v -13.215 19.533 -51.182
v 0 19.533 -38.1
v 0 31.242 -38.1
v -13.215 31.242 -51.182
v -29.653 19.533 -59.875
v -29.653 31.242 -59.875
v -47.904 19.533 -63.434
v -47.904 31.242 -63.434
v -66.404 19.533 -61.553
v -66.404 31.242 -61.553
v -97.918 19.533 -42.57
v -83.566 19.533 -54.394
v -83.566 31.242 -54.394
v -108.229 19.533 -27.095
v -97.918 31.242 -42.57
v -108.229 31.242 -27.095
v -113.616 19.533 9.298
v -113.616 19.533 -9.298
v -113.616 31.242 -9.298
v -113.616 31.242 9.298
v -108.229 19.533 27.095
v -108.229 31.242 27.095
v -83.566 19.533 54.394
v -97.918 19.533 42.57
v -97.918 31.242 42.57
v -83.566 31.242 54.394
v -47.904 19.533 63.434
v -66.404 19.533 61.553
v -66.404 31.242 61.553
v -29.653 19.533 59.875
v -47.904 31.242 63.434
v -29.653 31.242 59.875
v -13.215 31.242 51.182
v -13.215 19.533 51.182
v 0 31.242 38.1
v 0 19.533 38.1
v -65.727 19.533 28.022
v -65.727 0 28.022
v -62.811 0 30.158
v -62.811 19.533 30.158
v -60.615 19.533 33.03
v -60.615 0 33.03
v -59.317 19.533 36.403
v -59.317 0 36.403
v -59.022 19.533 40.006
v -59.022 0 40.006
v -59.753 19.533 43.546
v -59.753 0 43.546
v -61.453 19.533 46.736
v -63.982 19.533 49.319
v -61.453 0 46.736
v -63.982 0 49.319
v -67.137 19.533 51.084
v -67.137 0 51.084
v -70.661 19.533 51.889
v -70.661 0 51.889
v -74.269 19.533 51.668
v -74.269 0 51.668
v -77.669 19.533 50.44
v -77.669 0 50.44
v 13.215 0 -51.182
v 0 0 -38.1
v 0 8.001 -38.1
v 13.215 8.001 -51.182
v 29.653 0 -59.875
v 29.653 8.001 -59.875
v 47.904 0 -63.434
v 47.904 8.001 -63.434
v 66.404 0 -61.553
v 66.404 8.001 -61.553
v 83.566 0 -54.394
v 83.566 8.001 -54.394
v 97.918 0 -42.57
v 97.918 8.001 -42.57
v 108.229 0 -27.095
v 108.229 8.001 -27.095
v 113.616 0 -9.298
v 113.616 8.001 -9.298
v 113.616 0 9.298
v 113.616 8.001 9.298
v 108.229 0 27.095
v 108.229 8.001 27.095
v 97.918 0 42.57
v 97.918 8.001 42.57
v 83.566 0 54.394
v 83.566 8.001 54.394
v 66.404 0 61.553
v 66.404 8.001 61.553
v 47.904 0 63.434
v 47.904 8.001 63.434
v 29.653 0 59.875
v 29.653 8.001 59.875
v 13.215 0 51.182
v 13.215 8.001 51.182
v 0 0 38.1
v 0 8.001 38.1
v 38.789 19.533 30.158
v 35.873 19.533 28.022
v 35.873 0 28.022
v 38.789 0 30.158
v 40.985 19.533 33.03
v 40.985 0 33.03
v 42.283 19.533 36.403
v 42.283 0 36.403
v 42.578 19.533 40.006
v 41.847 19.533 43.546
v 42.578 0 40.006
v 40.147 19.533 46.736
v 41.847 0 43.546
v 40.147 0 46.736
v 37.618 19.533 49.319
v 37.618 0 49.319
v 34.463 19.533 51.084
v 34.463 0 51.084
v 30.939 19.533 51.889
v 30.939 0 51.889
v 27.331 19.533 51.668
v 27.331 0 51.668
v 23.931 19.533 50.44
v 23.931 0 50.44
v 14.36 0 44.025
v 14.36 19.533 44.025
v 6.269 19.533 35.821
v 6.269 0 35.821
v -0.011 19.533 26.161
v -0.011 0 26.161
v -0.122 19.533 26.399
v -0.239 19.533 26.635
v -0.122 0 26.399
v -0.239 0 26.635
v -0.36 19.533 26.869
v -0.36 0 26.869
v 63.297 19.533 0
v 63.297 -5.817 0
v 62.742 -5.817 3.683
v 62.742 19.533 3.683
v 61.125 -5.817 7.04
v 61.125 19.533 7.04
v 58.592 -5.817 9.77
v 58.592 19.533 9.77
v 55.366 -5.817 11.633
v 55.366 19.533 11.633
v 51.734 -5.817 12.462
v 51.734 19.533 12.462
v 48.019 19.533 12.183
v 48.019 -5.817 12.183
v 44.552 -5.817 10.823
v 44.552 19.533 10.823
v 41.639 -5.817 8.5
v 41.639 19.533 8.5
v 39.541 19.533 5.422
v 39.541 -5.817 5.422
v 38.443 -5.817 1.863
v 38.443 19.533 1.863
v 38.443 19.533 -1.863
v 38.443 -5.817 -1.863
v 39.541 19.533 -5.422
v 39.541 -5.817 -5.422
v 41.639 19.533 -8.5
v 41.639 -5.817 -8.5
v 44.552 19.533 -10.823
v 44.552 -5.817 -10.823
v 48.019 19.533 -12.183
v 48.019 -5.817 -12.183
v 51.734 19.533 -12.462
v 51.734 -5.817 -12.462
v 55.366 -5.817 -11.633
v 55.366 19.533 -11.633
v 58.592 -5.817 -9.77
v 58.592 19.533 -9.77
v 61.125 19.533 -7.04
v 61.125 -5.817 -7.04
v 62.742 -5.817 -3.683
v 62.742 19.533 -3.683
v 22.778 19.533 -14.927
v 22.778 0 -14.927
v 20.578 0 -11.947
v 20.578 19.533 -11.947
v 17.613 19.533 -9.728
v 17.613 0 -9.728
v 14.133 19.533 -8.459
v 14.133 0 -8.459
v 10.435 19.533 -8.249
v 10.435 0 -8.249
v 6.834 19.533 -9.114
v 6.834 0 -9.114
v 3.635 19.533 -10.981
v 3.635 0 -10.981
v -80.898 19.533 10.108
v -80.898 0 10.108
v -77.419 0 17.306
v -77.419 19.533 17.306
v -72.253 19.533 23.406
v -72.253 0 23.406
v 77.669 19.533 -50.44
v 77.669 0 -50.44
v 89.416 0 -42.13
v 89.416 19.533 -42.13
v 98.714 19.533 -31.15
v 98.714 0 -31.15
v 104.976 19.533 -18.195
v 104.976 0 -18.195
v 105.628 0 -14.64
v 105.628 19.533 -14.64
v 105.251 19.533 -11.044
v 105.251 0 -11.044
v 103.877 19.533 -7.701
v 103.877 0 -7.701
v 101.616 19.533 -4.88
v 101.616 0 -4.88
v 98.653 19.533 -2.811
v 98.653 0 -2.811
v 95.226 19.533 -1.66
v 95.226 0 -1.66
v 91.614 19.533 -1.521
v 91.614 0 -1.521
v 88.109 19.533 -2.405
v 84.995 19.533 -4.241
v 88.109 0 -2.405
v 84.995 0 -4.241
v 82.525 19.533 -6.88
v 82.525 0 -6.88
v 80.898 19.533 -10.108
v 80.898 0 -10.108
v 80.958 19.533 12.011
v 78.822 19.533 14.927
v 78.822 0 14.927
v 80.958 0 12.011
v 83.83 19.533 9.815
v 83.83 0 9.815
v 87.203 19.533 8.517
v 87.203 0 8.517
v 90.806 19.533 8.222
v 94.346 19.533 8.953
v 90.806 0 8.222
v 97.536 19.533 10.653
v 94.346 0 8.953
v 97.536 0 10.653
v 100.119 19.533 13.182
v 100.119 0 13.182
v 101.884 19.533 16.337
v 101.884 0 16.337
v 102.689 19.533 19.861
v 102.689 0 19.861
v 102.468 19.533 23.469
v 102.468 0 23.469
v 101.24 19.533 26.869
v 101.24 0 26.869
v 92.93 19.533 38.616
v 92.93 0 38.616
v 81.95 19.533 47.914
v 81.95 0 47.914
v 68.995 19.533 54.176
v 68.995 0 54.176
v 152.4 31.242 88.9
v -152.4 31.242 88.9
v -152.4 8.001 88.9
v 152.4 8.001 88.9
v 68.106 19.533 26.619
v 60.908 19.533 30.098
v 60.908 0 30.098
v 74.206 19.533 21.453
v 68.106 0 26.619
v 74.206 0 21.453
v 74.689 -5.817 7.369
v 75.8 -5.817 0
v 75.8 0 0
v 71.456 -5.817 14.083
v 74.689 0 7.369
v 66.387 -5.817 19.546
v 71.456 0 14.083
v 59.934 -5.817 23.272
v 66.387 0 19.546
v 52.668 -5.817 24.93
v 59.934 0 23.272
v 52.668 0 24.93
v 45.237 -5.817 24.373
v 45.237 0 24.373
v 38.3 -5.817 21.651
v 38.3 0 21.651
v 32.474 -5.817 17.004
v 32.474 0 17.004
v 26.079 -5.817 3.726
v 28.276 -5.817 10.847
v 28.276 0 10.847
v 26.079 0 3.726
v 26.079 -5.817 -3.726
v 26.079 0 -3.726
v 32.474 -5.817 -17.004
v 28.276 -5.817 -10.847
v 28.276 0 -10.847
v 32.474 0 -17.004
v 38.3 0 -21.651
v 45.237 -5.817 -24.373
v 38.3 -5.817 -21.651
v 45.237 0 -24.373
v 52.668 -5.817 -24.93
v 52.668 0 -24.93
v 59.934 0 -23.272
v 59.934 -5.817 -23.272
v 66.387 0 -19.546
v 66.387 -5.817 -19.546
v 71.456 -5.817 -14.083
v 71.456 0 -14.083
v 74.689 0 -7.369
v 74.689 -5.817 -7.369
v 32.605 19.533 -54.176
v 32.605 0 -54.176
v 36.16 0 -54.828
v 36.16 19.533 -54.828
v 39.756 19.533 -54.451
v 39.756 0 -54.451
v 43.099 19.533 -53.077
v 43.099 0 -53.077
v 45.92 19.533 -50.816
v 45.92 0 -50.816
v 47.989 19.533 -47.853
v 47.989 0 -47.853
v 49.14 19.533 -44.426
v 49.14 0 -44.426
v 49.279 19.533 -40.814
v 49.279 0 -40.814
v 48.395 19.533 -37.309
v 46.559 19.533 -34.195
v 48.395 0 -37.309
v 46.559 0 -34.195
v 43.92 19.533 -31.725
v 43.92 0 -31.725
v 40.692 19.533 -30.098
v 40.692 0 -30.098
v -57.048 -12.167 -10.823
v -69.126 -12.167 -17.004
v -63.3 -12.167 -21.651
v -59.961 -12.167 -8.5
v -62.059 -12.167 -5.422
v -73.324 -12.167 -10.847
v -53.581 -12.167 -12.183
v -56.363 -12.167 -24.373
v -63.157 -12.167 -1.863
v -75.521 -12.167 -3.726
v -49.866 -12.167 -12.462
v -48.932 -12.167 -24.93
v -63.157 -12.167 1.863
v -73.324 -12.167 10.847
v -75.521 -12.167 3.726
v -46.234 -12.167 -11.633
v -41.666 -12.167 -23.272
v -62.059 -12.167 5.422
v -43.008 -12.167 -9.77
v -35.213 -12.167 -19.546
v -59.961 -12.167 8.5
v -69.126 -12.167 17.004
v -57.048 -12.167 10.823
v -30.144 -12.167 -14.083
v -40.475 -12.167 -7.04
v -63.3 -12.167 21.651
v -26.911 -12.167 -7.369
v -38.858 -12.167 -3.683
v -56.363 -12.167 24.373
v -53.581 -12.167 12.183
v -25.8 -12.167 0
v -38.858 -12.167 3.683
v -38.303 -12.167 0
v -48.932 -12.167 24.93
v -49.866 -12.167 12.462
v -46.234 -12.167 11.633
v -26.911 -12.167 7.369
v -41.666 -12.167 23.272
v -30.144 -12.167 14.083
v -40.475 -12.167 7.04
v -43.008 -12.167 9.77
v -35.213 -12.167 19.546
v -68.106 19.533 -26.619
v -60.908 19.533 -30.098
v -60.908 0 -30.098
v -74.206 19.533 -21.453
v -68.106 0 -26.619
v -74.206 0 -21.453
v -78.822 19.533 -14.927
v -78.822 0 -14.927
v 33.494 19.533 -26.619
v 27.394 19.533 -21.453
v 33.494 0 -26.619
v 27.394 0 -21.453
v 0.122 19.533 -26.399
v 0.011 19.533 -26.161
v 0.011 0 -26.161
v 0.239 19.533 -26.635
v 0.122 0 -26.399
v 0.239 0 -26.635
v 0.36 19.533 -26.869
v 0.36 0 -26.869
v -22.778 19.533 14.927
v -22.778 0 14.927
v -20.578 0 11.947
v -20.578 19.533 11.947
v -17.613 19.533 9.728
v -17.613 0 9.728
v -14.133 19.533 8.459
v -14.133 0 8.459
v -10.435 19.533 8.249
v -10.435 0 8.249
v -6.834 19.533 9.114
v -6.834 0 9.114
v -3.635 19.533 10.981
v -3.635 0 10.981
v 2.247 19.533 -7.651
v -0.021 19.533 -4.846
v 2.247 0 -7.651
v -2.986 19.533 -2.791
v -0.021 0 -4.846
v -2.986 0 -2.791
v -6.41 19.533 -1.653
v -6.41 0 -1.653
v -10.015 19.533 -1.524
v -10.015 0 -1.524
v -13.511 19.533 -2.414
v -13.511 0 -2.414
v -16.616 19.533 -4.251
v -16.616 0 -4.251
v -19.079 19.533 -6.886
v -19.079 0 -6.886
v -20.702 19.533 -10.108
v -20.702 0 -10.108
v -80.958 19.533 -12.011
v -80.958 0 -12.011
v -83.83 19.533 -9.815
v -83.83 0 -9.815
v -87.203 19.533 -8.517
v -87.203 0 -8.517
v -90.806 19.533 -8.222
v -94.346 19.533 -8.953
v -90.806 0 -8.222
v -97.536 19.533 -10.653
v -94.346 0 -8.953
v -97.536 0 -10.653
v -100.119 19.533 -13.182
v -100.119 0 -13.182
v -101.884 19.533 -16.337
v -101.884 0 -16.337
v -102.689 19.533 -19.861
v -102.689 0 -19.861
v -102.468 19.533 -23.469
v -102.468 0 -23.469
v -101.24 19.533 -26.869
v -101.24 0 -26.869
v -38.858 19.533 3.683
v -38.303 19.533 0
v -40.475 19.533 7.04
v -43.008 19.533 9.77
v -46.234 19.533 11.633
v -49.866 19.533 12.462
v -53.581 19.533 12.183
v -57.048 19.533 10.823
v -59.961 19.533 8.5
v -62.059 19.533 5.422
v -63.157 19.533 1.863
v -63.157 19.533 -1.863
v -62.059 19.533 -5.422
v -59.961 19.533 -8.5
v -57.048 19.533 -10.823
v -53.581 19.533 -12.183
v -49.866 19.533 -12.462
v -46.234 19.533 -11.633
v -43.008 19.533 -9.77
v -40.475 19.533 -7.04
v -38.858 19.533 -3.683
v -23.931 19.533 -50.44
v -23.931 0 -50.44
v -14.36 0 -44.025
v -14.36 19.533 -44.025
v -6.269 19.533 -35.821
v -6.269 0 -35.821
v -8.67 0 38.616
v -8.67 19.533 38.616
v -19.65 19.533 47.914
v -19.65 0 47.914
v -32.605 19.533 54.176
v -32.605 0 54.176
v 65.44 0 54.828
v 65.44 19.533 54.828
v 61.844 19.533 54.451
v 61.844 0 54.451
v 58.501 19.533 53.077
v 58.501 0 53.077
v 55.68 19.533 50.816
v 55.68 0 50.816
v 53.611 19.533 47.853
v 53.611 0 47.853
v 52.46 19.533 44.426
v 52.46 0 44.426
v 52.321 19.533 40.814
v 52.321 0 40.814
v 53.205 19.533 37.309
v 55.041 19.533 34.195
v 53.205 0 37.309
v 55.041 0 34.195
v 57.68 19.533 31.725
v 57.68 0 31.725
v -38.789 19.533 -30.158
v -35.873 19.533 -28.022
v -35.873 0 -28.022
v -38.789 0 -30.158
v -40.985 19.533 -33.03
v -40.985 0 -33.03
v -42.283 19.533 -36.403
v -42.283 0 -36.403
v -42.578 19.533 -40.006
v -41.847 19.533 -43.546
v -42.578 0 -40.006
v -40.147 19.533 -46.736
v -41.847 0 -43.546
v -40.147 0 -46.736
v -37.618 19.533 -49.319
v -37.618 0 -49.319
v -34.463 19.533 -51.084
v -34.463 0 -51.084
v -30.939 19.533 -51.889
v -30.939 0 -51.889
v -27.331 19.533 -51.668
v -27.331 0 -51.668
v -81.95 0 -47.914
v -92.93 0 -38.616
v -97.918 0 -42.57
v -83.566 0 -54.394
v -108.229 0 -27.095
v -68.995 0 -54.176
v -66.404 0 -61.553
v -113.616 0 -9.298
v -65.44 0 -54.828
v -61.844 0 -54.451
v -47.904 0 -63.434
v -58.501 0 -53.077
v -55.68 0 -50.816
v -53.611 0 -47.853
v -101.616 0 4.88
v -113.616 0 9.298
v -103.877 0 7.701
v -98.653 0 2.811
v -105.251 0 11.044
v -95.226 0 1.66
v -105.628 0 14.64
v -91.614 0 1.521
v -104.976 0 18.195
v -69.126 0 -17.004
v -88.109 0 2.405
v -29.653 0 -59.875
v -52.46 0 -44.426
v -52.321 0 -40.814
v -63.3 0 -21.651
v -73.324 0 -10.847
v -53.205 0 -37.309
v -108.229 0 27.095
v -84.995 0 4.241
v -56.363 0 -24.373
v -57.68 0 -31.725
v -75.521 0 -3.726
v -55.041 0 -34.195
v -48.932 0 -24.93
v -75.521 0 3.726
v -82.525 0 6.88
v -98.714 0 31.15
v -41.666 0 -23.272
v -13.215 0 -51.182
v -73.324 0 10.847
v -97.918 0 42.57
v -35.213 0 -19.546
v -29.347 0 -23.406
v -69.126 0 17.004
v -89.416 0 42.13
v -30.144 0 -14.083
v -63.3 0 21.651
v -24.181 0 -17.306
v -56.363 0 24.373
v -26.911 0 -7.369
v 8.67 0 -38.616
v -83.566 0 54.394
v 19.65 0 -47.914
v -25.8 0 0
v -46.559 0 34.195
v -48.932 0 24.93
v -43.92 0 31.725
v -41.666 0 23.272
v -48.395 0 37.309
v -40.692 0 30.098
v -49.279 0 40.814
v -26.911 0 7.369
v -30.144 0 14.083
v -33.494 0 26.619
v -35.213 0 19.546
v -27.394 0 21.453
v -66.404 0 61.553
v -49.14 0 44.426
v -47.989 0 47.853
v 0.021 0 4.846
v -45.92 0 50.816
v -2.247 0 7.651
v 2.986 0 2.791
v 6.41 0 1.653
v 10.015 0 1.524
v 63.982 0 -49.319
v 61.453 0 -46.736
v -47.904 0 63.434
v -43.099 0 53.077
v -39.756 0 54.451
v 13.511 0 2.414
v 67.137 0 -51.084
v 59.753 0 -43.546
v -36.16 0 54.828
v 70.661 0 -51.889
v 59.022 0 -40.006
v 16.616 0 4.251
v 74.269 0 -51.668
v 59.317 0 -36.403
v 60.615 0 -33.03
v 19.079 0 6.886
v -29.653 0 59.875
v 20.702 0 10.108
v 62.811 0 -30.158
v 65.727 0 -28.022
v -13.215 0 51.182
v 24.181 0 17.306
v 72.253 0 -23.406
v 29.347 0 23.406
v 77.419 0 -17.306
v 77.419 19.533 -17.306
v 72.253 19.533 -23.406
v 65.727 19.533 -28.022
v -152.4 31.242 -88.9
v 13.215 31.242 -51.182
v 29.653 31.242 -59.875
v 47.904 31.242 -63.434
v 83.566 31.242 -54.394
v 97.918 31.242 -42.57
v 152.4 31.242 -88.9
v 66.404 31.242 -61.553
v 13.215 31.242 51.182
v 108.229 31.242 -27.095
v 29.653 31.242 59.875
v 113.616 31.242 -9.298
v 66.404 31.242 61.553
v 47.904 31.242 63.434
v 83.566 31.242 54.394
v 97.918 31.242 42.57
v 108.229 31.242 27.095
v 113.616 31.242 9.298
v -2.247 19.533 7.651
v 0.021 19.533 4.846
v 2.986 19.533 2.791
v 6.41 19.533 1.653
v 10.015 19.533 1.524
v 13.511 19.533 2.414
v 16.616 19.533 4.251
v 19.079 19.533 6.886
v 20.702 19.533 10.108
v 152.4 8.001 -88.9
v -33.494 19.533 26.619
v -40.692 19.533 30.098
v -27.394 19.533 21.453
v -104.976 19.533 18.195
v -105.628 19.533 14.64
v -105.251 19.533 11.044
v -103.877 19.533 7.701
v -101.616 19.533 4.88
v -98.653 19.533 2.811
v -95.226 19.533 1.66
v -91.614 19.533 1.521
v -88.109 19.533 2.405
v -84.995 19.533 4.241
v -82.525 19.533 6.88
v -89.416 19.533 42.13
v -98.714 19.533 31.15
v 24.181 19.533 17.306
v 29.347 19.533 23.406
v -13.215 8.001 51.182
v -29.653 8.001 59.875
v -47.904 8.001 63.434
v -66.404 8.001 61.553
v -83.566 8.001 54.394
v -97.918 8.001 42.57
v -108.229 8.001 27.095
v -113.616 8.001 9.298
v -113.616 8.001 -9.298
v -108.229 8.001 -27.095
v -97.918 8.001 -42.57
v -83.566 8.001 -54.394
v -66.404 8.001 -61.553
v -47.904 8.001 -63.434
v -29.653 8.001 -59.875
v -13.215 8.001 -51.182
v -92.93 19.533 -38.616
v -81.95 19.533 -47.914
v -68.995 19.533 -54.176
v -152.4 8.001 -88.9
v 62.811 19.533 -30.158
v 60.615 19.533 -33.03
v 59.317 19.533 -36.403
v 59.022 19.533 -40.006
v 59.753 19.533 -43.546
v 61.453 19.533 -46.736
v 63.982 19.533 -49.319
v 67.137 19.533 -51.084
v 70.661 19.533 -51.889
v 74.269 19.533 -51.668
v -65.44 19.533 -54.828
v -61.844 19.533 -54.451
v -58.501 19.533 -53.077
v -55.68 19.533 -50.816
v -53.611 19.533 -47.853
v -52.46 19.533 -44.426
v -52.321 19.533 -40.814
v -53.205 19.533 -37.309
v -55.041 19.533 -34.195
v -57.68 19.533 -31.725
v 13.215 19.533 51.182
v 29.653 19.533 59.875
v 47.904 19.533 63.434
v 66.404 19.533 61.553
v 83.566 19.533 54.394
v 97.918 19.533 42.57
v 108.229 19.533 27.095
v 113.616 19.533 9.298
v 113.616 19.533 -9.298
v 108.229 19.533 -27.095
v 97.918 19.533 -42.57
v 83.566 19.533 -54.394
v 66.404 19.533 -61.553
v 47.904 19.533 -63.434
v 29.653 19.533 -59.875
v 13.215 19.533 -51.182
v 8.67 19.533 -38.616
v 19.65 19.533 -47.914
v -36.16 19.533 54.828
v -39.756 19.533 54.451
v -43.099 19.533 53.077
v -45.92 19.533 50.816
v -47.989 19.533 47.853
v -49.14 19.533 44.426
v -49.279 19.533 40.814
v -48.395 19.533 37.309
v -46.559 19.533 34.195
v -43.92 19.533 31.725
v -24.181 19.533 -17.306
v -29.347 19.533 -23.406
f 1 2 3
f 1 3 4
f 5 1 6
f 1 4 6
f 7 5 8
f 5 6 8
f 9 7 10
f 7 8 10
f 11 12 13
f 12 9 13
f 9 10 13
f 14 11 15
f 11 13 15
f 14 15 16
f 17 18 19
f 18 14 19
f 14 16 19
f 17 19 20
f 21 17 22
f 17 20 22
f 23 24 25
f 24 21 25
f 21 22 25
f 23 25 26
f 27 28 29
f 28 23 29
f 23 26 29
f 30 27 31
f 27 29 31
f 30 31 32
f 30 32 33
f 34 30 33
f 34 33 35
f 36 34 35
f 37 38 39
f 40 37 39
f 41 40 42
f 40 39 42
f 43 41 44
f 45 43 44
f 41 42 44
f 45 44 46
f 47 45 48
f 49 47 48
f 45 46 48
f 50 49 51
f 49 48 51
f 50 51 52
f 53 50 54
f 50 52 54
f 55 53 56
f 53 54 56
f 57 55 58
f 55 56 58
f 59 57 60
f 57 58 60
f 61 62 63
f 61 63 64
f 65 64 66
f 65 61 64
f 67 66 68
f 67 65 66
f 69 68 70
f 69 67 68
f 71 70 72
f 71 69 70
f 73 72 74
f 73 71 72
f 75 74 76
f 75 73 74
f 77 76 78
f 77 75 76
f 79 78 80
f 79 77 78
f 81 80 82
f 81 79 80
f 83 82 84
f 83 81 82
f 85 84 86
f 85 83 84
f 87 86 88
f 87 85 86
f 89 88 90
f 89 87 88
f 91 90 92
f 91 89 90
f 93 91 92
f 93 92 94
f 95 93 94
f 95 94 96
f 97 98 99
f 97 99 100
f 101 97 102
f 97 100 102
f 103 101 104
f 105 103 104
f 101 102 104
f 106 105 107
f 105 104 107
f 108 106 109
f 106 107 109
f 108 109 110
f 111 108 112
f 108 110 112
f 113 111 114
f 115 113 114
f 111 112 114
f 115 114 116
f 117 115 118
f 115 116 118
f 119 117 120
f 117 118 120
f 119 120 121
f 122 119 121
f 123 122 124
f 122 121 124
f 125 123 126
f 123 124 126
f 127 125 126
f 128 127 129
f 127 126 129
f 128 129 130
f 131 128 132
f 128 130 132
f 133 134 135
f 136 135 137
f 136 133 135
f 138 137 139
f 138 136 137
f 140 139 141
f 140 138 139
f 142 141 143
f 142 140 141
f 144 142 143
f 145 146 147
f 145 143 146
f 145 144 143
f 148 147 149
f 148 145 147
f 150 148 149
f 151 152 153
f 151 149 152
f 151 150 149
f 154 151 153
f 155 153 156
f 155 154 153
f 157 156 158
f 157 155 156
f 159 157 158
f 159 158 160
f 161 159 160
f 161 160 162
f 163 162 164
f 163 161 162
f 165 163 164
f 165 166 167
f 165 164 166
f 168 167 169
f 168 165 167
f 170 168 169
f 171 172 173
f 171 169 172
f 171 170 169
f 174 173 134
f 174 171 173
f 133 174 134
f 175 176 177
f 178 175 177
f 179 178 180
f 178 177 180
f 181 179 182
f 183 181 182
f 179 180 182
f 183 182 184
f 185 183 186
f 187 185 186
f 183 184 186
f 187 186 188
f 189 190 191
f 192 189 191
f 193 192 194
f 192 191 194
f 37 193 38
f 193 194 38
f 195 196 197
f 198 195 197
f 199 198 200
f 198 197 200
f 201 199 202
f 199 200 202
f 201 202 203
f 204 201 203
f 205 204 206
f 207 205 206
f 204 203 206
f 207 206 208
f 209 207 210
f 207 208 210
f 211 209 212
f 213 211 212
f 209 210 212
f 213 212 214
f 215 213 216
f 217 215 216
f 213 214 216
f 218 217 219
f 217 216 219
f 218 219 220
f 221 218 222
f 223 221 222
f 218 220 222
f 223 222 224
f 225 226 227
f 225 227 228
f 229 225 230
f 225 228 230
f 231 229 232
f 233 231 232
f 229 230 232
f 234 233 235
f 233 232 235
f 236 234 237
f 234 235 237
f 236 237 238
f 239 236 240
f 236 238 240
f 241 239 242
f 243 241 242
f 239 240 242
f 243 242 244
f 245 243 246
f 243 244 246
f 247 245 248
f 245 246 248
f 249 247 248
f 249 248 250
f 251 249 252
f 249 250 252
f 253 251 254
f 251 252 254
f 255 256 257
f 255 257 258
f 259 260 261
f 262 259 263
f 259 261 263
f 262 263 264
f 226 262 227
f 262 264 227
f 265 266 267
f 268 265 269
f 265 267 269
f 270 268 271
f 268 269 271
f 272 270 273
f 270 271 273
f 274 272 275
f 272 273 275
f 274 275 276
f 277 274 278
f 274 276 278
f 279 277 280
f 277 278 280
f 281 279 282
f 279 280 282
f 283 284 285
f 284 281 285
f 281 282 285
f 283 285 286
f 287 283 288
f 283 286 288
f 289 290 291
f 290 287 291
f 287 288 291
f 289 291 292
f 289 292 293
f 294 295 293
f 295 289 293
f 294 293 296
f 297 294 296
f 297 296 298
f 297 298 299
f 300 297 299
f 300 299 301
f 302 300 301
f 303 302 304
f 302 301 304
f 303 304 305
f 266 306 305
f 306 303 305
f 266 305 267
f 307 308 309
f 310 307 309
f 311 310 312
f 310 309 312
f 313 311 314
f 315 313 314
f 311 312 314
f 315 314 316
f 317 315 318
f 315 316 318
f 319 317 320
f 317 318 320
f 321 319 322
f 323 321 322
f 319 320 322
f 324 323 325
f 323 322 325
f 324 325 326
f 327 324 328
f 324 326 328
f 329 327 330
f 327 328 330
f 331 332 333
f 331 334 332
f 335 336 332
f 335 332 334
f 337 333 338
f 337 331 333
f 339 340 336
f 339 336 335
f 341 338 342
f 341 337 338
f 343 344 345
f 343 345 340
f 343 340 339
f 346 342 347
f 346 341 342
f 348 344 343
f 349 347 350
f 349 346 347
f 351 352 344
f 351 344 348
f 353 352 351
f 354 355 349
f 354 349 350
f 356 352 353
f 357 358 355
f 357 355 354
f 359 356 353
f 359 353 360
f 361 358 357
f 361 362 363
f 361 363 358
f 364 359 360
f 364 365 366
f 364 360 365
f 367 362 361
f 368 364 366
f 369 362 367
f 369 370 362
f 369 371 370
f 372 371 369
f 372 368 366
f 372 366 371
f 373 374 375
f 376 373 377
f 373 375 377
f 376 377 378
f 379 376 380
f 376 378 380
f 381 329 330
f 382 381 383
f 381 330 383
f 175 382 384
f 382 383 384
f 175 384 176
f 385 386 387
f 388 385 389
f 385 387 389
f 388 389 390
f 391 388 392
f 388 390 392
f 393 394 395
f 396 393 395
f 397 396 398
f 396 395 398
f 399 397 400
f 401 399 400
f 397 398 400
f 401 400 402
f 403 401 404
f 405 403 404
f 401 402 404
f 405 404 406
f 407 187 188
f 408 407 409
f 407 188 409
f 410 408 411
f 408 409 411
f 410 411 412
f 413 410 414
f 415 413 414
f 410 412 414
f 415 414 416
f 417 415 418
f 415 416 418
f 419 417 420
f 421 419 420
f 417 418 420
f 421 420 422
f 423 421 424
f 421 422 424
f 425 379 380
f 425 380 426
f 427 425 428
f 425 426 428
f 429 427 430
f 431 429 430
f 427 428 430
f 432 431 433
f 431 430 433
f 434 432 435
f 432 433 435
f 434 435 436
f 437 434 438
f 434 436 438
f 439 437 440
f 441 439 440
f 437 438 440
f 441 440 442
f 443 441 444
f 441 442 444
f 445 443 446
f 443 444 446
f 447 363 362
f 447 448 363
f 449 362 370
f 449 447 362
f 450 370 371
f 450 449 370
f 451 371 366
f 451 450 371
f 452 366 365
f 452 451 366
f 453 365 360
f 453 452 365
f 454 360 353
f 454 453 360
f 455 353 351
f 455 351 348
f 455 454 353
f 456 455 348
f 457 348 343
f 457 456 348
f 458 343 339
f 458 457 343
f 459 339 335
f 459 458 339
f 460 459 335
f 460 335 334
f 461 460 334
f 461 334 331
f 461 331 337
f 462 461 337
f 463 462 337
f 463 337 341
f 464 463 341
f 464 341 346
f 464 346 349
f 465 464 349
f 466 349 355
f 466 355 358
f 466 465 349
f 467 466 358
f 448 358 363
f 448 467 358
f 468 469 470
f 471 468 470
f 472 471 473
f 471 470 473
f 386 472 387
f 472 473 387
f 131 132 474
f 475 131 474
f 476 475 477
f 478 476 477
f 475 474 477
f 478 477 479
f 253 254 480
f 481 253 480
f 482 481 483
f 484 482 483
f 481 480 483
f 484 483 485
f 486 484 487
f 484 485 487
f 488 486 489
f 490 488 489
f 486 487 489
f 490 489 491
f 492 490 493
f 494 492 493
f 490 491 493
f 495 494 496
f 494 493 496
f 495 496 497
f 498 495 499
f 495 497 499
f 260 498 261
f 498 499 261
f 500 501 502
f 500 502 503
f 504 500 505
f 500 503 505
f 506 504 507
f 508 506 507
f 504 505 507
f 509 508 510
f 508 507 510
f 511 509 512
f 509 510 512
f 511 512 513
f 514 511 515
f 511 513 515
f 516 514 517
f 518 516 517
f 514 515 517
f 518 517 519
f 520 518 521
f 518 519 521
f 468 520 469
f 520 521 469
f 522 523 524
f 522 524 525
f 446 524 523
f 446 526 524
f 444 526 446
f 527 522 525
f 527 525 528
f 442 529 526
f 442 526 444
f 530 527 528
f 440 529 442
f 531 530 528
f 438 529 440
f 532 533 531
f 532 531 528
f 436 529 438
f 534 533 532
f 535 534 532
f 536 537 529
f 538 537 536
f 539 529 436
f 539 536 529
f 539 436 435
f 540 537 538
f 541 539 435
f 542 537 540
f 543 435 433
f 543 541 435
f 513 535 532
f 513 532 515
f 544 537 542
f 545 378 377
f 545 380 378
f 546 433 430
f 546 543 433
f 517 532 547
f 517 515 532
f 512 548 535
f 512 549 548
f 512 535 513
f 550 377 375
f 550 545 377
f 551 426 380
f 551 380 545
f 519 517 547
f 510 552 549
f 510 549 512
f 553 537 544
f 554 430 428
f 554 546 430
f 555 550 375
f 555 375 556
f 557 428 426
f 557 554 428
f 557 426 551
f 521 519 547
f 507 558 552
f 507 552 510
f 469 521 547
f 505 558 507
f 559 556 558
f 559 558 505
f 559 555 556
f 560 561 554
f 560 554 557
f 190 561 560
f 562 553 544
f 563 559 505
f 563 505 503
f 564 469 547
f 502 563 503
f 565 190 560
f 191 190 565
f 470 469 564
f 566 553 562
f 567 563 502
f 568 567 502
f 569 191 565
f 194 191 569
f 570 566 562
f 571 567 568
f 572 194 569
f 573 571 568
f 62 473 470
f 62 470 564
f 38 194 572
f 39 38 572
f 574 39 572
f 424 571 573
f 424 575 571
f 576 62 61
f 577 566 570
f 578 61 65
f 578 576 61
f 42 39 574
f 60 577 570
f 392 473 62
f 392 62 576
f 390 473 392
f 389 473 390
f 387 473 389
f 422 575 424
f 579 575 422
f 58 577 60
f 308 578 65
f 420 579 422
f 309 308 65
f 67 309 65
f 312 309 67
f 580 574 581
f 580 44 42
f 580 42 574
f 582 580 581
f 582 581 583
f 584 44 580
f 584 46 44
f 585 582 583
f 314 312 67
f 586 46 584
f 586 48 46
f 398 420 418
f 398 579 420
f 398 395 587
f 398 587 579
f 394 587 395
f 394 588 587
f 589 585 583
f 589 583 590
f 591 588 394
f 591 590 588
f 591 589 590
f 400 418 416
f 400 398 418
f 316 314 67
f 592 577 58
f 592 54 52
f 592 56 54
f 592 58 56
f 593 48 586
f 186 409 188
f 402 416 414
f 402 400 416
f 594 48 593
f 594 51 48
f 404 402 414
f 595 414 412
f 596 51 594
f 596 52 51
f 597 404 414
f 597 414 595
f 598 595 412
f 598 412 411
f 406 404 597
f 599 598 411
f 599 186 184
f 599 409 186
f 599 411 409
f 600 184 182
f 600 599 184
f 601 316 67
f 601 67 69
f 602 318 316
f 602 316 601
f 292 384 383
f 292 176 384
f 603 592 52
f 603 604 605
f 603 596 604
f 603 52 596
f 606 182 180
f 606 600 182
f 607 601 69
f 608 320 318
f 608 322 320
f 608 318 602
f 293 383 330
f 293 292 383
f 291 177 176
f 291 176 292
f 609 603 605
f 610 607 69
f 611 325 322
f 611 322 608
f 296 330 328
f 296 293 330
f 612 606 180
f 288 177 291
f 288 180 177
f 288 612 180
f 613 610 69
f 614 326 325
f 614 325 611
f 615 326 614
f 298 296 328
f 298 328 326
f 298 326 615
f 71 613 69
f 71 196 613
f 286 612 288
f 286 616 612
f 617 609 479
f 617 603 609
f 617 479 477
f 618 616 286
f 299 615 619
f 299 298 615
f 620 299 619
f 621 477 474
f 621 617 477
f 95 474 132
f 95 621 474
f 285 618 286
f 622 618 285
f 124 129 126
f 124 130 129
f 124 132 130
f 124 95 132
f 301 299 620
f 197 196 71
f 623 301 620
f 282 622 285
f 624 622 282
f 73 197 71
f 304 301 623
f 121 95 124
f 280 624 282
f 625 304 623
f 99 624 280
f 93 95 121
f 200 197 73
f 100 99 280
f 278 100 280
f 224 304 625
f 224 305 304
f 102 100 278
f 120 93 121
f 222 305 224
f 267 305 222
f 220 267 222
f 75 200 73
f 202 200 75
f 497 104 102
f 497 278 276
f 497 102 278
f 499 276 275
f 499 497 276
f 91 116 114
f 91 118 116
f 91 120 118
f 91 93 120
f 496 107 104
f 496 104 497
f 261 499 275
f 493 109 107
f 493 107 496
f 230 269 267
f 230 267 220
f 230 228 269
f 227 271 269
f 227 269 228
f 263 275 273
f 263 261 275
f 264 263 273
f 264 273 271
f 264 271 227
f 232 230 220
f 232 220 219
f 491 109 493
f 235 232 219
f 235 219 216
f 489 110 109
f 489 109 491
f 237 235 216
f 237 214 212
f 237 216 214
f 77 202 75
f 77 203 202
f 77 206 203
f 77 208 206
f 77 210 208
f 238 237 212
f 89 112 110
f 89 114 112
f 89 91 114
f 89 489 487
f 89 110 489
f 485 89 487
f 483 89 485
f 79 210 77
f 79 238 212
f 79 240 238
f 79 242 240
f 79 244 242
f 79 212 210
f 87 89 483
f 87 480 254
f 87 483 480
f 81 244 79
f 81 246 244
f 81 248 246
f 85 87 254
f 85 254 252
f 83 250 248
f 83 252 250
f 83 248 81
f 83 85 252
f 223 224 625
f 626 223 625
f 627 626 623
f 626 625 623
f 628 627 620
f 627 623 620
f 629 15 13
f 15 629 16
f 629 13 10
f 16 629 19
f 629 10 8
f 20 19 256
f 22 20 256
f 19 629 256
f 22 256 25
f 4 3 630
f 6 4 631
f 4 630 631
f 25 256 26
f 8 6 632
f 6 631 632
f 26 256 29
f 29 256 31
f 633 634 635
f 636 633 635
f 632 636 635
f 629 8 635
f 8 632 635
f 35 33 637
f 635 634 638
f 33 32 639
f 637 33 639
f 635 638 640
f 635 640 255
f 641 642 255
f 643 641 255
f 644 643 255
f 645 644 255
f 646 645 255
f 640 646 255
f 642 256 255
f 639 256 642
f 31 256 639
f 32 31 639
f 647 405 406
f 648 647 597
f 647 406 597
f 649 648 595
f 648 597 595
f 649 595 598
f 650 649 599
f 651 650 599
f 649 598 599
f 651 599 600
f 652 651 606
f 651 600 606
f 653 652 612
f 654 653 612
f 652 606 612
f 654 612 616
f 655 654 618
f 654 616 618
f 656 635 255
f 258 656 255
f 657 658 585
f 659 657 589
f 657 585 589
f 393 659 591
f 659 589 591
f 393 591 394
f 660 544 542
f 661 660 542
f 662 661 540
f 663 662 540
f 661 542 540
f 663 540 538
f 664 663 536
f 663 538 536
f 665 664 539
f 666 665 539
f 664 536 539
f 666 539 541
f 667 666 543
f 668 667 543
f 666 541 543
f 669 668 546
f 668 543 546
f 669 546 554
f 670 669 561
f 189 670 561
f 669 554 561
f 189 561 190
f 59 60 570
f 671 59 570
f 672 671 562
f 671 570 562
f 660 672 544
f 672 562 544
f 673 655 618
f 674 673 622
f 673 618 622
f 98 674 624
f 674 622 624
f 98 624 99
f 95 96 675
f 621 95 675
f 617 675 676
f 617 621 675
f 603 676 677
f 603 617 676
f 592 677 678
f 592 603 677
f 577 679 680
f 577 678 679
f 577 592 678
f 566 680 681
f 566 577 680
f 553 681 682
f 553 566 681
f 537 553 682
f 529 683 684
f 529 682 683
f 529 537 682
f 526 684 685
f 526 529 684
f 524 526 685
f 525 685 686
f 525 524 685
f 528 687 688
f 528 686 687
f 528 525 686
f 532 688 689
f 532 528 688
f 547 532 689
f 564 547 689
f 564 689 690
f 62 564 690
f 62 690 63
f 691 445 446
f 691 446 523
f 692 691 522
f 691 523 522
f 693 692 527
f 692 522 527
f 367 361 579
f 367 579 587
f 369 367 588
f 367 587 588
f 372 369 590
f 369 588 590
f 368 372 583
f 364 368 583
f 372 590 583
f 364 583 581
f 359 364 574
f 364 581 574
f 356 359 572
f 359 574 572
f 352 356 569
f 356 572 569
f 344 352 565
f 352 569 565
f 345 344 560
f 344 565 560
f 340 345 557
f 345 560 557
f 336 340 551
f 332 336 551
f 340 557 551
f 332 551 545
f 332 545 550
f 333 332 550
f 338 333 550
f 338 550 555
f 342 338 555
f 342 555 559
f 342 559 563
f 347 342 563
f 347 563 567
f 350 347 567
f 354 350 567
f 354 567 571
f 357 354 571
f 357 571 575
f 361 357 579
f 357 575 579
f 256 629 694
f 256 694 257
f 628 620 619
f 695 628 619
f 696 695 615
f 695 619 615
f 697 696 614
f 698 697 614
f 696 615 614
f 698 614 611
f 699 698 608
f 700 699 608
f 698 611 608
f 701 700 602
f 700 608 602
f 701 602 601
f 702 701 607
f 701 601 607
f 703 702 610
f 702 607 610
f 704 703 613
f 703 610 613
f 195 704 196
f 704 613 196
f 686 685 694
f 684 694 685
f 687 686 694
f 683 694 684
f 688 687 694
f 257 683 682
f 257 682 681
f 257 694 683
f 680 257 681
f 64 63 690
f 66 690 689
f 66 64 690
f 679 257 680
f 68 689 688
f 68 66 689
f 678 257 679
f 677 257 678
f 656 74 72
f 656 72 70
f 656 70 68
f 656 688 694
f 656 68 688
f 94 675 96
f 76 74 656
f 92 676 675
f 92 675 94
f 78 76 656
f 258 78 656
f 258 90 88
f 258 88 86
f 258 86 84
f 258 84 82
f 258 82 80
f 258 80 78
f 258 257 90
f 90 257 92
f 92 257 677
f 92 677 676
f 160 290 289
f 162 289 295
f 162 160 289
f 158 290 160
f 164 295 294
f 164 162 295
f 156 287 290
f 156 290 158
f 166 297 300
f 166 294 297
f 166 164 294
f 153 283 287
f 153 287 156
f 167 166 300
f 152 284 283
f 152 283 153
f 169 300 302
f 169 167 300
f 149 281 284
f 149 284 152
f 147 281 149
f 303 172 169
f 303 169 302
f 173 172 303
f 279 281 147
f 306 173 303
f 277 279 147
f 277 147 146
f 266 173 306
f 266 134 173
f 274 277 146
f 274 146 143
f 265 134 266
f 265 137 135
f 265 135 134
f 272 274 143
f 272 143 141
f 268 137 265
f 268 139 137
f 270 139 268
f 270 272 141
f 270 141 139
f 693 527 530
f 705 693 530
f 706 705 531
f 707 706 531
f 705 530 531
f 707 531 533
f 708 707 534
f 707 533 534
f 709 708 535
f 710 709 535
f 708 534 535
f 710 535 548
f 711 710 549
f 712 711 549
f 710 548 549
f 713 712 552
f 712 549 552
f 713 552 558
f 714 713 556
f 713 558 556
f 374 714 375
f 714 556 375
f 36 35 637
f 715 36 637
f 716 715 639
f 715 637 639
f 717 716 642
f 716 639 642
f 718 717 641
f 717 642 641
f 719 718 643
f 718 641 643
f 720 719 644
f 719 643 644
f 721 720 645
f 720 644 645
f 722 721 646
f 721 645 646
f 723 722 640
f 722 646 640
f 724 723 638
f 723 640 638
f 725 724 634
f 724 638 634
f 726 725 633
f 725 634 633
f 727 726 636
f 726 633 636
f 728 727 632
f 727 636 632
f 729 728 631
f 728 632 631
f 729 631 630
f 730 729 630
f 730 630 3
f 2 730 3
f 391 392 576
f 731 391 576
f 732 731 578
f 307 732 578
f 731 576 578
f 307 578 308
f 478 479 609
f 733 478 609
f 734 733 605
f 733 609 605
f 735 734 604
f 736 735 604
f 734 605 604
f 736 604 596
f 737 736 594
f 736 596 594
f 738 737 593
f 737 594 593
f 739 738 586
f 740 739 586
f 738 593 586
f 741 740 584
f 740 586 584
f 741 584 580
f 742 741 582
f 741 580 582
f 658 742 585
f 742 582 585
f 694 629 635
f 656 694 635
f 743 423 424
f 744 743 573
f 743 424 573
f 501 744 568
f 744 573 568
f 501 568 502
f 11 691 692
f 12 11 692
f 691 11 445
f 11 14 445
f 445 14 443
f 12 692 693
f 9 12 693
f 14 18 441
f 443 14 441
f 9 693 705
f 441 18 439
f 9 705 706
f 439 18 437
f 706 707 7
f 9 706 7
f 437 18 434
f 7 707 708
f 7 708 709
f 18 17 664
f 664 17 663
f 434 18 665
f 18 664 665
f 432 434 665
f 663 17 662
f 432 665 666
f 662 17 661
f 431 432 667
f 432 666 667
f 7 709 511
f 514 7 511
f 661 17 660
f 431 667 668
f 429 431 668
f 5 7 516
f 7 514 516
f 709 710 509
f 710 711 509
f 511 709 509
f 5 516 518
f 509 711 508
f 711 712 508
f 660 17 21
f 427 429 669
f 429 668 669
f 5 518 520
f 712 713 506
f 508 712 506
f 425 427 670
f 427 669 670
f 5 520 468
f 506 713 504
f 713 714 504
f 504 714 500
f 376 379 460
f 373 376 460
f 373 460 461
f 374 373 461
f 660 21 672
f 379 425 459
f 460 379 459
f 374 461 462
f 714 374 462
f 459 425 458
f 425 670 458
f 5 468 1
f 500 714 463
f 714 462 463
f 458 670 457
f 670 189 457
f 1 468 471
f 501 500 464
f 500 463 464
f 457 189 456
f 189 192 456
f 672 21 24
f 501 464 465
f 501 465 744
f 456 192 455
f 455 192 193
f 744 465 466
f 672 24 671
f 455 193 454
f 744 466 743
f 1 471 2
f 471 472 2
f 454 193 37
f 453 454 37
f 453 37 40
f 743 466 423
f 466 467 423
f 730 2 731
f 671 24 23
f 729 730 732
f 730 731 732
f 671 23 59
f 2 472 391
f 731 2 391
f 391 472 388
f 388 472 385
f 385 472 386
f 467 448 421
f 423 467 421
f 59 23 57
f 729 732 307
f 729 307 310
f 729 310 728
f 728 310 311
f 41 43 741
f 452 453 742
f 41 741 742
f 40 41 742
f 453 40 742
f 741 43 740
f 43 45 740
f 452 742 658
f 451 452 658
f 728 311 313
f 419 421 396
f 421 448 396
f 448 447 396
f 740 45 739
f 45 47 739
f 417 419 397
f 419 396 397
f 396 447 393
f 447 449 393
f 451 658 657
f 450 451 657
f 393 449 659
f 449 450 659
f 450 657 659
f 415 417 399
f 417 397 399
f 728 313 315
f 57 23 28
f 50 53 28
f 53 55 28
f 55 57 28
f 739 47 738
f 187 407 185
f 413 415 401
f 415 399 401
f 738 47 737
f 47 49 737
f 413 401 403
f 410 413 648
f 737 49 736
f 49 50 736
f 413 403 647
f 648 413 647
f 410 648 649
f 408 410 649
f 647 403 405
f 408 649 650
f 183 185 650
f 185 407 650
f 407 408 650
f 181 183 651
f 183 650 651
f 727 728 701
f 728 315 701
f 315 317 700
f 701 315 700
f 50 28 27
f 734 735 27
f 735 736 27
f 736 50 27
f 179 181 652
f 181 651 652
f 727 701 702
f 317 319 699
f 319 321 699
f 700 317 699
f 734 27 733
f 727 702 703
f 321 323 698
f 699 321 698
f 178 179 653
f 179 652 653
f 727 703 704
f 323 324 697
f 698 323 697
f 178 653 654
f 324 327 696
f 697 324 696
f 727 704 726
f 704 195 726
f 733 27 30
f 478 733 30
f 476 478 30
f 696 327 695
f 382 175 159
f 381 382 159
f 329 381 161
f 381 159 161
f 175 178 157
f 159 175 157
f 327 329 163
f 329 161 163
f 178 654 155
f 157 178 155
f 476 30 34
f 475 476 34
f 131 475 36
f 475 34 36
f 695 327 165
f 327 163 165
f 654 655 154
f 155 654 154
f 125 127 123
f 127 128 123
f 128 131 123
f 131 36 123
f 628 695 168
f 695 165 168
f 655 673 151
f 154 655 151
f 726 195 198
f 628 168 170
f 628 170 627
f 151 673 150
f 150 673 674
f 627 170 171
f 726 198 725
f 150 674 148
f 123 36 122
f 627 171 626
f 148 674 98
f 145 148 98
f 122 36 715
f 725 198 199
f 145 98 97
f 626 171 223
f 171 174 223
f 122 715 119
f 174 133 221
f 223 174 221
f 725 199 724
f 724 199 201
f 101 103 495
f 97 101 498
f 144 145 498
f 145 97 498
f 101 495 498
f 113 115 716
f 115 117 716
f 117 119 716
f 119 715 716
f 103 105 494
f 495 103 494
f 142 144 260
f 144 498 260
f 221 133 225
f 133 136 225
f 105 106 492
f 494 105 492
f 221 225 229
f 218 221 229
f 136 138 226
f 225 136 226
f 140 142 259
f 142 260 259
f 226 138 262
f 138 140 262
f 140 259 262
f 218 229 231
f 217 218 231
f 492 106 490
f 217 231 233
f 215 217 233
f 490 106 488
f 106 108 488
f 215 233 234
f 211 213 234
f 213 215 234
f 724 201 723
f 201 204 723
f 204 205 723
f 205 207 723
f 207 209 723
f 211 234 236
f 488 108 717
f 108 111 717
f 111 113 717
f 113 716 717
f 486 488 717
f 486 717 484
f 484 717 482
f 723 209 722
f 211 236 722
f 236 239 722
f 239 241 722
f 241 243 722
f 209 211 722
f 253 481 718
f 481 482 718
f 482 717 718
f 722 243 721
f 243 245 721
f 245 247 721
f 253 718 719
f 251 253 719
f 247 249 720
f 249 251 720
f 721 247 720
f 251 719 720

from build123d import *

# Parameters (mm, degrees)
F2_W          = 304.8
F2_H          = 177.8
F3_DEPTH      = 23.241
F0_R          = 25
F0_R_2        = 12.4968
F4_DEPTH      = 12.1666
F5_DEPTH      = 19.5326
F6_W          = 127
F6_H          = 25.4
F7_DEPTH      = 127
F7_DEPTH_BACK = 127
F9_DEPTH      = 31.243


with BuildPart() as f3:
    # F2 (on offset) → F3 (new body)
    with BuildSketch(Plane.XZ.offset(-31.242)):
        Rectangle(F2_W, F2_H)
        with BuildLine():
            ThreePointArc((0, -38.1), (-114.3, 0), (0, 38.1))
            ThreePointArc((0, 38.1), (70.8804631421, 60.2413894262), (114.3, 0))
            ThreePointArc((114.3, 0), (70.8804631421, -60.2413894262), (0, -38.1))
        make_face(mode=Mode.SUBTRACT)
    extrude(amount=F3_DEPTH)



with BuildPart() as f4:
    # F0 (on Front) → F4 (new body)
    with BuildSketch(Plane.XZ):
        with Locations((-50.8, 0)):
            Circle(F0_R)
        with Locations((-50.8, 0)):
            Circle(F0_R_2, mode=Mode.SUBTRACT)
    extrude(amount=F4_DEPTH)


with BuildPart() as f4b:
    # F0 (on Front) → F4, piece 2 (new body)
    with BuildSketch(Plane.XZ):
        with Locations((50.8, 0)):
            Circle(F0_R)
        with Locations((50.8, 0)):
            Circle(F0_R_2, mode=Mode.SUBTRACT)
    extrude(amount=F4_DEPTH)


with BuildPart() as f3_1:
    add(f3.part)

    add(f4.part)  # F5 merges F4

    add(f4b.part)  # F5 merges F4b
    # F0 (on Front) → F5 (join)
    with BuildSketch(Plane.XZ):
        with BuildLine():
            ThreePointArc((0, -38.1), (-12.7, 0), (0, 38.1))
            ThreePointArc((0, 38.1), (-114.3, 0), (0, -38.1))
        make_face()
        with Locations((-50.8, 0)):
            Circle(F0_R, mode=Mode.SUBTRACT)
        with Locations((-50.8, 0)):
            Circle(F0_R)
        with Locations((-50.8, 0)):
            Circle(F0_R_2, mode=Mode.SUBTRACT)
        with BuildLine():
            ThreePointArc((0, 38.1), (9.4413894262, 20.0804631421), (12.7, 0))
            ThreePointArc((12.7, 0), (9.4413894262, -20.0804631421), (0, -38.1))
            ThreePointArc((0, -38.1), (70.8804631421, -60.2413894262), (114.3, 0))
            ThreePointArc((114.3, 0), (70.8804631421, 60.2413894262), (0, 38.1))
        make_face()
        with Locations((50.8, 0)):
            Circle(F0_R, mode=Mode.SUBTRACT)
        with Locations((50.8, 0)):
            Circle(F0_R)
        with Locations((50.8, 0)):
            Circle(F0_R_2, mode=Mode.SUBTRACT)
        with BuildLine():
            ThreePointArc((0, -38.1), (9.4413894262, -20.0804631421), (12.7, 0))
            ThreePointArc((12.7, 0), (9.4413894262, 20.0804631421), (0, 38.1))
            ThreePointArc((0, 38.1), (-12.7, 0), (0, -38.1))
        make_face()
    extrude(amount=-F5_DEPTH)

    # F6 (on Top) → F7 (cut, two sides)
    with BuildSketch(Plane.XY) as f7_sk:
        with Locations((63.5, -18.5166)):
            Rectangle(F6_W, F6_H)
    extrude(amount=-F7_DEPTH, mode=Mode.SUBTRACT)
    extrude(f7_sk.sketch, amount=F7_DEPTH_BACK, mode=Mode.SUBTRACT)

    # F8 (on Front) → F9 (cut, through all)
    with BuildSketch(Plane.XZ):
        with BuildLine():
            ThreePointArc((-65.7271030045, 28.0222071917), (-60.4890613296, 45.2019312701), (-77.6687854081, 50.439972945))
            ThreePointArc((-77.6687854081, 50.439972945), (-94.411945371, 36.9340049406), (-104.9761603541, 18.1952232547))
            ThreePointArc((-104.9761603541, 18.1952232547), (-96.9803965542, 2.1126935639), (-80.8978668634, 10.1084573637))
            ThreePointArc((-80.8978668634, 10.1084573637), (-75.0288585395, 20.5188916337), (-65.7271030045, 28.0222071917))
        make_face()
        with BuildLine():
            ThreePointArc((-78.8222071917, -14.9271030045), (-96.0019312701, -9.6890613296), (-101.239972945, -26.8687854081))
            ThreePointArc((-101.239972945, -26.8687854081), (-87.7340049406, -43.611945371), (-68.9952232547, -54.1761603541))
            ThreePointArc((-68.9952232547, -54.1761603541), (-52.9126935639, -46.1803965542), (-60.9084573637, -30.0978668634))
            ThreePointArc((-60.9084573637, -30.0978668634), (-71.3188916337, -24.2288585395), (-78.8222071917, -14.9271030045))
        make_face()
        with BuildLine():
            ThreePointArc((-35.8728969955, -28.0222071917), (-41.1109386704, -45.2019312701), (-23.9312145919, -50.439972945))
            ThreePointArc((-23.9312145919, -50.439972945), (-10.107305041, -40.127634829), (0.010733032, -26.1608850911))
            ThreePointArc((0.010733032, -26.1608850911), (0.1798786546, -26.5175497593), (0.360027055, -26.8687854081))
            ThreePointArc((0.360027055, -26.8687854081), (13.8659950594, -43.611945371), (32.6047767453, -54.1761603541))
            ThreePointArc((32.6047767453, -54.1761603541), (48.6873064361, -46.1803965542), (40.6915426363, -30.0978668634))
            ThreePointArc((40.6915426363, -30.0978668634), (30.2811083663, -24.2288585395), (22.7777928083, -14.9271030045))
            ThreePointArc((22.7777928083, -14.9271030045), (14.1328150363, -8.4594398503), (3.6348708656, -10.9812399102))
            ThreePointArc((3.6348708656, -10.9812399102), (-8.2078269406, -1.4599992342), (-20.7021331366, -10.1084573637))
            ThreePointArc((-20.7021331366, -10.1084573637), (-26.5711414605, -20.5188916337), (-35.8728969955, -28.0222071917))
        make_face()
        with BuildLine():
            ThreePointArc((-0.010733032, 26.1608850911), (-0.1798786546, 26.5175497593), (-0.360027055, 26.8687854081))
            ThreePointArc((-0.360027055, 26.8687854081), (-13.8659950594, 43.611945371), (-32.6047767453, 54.1761603541))
            ThreePointArc((-32.6047767453, 54.1761603541), (-48.6873064361, 46.1803965542), (-40.6915426363, 30.0978668634))
            ThreePointArc((-40.6915426363, 30.0978668634), (-30.2811083663, 24.2288585395), (-22.7777928083, 14.9271030045))
            ThreePointArc((-22.7777928083, 14.9271030045), (-14.1328150363, 8.4594398503), (-3.6348708656, 10.9812399102))
            ThreePointArc((-3.6348708656, 10.9812399102), (8.2078269406, 1.4599992342), (20.7021331366, 10.1084573637))
            ThreePointArc((20.7021331366, 10.1084573637), (26.5711414605, 20.5188916337), (35.8728969955, 28.0222071917))
            ThreePointArc((35.8728969955, 28.0222071917), (41.1109386704, 45.2019312701), (23.9312145919, 50.439972945))
            ThreePointArc((23.9312145919, 50.439972945), (10.107305041, 40.127634829), (-0.010733032, 26.1608850911))
        make_face()
        with BuildLine():
            ThreePointArc((101.239972945, 26.8687854081), (87.7340049406, 43.611945371), (68.9952232547, 54.1761603541))
            ThreePointArc((68.9952232547, 54.1761603541), (52.9126935639, 46.1803965542), (60.9084573637, 30.0978668634))
            ThreePointArc((60.9084573637, 30.0978668634), (71.3188916337, 24.2288585395), (78.8222071917, 14.9271030045))
            ThreePointArc((78.8222071917, 14.9271030045), (96.0019312701, 9.6890613296), (101.239972945, 26.8687854081))
        make_face()
        with BuildLine():
            ThreePointArc((77.6687854081, -50.439972945), (94.411945371, -36.9340049406), (104.9761603541, -18.1952232547))
            ThreePointArc((104.9761603541, -18.1952232547), (96.9803965542, -2.1126935639), (80.8978668634, -10.1084573637))
            ThreePointArc((80.8978668634, -10.1084573637), (75.0288585395, -20.5188916337), (65.7271030045, -28.0222071917))
            ThreePointArc((65.7271030045, -28.0222071917), (60.4890613296, -45.2019312701), (77.6687854081, -50.439972945))
        make_face()
    extrude(amount=-F9_DEPTH, mode=Mode.SUBTRACT)


solid = f3_1.part
